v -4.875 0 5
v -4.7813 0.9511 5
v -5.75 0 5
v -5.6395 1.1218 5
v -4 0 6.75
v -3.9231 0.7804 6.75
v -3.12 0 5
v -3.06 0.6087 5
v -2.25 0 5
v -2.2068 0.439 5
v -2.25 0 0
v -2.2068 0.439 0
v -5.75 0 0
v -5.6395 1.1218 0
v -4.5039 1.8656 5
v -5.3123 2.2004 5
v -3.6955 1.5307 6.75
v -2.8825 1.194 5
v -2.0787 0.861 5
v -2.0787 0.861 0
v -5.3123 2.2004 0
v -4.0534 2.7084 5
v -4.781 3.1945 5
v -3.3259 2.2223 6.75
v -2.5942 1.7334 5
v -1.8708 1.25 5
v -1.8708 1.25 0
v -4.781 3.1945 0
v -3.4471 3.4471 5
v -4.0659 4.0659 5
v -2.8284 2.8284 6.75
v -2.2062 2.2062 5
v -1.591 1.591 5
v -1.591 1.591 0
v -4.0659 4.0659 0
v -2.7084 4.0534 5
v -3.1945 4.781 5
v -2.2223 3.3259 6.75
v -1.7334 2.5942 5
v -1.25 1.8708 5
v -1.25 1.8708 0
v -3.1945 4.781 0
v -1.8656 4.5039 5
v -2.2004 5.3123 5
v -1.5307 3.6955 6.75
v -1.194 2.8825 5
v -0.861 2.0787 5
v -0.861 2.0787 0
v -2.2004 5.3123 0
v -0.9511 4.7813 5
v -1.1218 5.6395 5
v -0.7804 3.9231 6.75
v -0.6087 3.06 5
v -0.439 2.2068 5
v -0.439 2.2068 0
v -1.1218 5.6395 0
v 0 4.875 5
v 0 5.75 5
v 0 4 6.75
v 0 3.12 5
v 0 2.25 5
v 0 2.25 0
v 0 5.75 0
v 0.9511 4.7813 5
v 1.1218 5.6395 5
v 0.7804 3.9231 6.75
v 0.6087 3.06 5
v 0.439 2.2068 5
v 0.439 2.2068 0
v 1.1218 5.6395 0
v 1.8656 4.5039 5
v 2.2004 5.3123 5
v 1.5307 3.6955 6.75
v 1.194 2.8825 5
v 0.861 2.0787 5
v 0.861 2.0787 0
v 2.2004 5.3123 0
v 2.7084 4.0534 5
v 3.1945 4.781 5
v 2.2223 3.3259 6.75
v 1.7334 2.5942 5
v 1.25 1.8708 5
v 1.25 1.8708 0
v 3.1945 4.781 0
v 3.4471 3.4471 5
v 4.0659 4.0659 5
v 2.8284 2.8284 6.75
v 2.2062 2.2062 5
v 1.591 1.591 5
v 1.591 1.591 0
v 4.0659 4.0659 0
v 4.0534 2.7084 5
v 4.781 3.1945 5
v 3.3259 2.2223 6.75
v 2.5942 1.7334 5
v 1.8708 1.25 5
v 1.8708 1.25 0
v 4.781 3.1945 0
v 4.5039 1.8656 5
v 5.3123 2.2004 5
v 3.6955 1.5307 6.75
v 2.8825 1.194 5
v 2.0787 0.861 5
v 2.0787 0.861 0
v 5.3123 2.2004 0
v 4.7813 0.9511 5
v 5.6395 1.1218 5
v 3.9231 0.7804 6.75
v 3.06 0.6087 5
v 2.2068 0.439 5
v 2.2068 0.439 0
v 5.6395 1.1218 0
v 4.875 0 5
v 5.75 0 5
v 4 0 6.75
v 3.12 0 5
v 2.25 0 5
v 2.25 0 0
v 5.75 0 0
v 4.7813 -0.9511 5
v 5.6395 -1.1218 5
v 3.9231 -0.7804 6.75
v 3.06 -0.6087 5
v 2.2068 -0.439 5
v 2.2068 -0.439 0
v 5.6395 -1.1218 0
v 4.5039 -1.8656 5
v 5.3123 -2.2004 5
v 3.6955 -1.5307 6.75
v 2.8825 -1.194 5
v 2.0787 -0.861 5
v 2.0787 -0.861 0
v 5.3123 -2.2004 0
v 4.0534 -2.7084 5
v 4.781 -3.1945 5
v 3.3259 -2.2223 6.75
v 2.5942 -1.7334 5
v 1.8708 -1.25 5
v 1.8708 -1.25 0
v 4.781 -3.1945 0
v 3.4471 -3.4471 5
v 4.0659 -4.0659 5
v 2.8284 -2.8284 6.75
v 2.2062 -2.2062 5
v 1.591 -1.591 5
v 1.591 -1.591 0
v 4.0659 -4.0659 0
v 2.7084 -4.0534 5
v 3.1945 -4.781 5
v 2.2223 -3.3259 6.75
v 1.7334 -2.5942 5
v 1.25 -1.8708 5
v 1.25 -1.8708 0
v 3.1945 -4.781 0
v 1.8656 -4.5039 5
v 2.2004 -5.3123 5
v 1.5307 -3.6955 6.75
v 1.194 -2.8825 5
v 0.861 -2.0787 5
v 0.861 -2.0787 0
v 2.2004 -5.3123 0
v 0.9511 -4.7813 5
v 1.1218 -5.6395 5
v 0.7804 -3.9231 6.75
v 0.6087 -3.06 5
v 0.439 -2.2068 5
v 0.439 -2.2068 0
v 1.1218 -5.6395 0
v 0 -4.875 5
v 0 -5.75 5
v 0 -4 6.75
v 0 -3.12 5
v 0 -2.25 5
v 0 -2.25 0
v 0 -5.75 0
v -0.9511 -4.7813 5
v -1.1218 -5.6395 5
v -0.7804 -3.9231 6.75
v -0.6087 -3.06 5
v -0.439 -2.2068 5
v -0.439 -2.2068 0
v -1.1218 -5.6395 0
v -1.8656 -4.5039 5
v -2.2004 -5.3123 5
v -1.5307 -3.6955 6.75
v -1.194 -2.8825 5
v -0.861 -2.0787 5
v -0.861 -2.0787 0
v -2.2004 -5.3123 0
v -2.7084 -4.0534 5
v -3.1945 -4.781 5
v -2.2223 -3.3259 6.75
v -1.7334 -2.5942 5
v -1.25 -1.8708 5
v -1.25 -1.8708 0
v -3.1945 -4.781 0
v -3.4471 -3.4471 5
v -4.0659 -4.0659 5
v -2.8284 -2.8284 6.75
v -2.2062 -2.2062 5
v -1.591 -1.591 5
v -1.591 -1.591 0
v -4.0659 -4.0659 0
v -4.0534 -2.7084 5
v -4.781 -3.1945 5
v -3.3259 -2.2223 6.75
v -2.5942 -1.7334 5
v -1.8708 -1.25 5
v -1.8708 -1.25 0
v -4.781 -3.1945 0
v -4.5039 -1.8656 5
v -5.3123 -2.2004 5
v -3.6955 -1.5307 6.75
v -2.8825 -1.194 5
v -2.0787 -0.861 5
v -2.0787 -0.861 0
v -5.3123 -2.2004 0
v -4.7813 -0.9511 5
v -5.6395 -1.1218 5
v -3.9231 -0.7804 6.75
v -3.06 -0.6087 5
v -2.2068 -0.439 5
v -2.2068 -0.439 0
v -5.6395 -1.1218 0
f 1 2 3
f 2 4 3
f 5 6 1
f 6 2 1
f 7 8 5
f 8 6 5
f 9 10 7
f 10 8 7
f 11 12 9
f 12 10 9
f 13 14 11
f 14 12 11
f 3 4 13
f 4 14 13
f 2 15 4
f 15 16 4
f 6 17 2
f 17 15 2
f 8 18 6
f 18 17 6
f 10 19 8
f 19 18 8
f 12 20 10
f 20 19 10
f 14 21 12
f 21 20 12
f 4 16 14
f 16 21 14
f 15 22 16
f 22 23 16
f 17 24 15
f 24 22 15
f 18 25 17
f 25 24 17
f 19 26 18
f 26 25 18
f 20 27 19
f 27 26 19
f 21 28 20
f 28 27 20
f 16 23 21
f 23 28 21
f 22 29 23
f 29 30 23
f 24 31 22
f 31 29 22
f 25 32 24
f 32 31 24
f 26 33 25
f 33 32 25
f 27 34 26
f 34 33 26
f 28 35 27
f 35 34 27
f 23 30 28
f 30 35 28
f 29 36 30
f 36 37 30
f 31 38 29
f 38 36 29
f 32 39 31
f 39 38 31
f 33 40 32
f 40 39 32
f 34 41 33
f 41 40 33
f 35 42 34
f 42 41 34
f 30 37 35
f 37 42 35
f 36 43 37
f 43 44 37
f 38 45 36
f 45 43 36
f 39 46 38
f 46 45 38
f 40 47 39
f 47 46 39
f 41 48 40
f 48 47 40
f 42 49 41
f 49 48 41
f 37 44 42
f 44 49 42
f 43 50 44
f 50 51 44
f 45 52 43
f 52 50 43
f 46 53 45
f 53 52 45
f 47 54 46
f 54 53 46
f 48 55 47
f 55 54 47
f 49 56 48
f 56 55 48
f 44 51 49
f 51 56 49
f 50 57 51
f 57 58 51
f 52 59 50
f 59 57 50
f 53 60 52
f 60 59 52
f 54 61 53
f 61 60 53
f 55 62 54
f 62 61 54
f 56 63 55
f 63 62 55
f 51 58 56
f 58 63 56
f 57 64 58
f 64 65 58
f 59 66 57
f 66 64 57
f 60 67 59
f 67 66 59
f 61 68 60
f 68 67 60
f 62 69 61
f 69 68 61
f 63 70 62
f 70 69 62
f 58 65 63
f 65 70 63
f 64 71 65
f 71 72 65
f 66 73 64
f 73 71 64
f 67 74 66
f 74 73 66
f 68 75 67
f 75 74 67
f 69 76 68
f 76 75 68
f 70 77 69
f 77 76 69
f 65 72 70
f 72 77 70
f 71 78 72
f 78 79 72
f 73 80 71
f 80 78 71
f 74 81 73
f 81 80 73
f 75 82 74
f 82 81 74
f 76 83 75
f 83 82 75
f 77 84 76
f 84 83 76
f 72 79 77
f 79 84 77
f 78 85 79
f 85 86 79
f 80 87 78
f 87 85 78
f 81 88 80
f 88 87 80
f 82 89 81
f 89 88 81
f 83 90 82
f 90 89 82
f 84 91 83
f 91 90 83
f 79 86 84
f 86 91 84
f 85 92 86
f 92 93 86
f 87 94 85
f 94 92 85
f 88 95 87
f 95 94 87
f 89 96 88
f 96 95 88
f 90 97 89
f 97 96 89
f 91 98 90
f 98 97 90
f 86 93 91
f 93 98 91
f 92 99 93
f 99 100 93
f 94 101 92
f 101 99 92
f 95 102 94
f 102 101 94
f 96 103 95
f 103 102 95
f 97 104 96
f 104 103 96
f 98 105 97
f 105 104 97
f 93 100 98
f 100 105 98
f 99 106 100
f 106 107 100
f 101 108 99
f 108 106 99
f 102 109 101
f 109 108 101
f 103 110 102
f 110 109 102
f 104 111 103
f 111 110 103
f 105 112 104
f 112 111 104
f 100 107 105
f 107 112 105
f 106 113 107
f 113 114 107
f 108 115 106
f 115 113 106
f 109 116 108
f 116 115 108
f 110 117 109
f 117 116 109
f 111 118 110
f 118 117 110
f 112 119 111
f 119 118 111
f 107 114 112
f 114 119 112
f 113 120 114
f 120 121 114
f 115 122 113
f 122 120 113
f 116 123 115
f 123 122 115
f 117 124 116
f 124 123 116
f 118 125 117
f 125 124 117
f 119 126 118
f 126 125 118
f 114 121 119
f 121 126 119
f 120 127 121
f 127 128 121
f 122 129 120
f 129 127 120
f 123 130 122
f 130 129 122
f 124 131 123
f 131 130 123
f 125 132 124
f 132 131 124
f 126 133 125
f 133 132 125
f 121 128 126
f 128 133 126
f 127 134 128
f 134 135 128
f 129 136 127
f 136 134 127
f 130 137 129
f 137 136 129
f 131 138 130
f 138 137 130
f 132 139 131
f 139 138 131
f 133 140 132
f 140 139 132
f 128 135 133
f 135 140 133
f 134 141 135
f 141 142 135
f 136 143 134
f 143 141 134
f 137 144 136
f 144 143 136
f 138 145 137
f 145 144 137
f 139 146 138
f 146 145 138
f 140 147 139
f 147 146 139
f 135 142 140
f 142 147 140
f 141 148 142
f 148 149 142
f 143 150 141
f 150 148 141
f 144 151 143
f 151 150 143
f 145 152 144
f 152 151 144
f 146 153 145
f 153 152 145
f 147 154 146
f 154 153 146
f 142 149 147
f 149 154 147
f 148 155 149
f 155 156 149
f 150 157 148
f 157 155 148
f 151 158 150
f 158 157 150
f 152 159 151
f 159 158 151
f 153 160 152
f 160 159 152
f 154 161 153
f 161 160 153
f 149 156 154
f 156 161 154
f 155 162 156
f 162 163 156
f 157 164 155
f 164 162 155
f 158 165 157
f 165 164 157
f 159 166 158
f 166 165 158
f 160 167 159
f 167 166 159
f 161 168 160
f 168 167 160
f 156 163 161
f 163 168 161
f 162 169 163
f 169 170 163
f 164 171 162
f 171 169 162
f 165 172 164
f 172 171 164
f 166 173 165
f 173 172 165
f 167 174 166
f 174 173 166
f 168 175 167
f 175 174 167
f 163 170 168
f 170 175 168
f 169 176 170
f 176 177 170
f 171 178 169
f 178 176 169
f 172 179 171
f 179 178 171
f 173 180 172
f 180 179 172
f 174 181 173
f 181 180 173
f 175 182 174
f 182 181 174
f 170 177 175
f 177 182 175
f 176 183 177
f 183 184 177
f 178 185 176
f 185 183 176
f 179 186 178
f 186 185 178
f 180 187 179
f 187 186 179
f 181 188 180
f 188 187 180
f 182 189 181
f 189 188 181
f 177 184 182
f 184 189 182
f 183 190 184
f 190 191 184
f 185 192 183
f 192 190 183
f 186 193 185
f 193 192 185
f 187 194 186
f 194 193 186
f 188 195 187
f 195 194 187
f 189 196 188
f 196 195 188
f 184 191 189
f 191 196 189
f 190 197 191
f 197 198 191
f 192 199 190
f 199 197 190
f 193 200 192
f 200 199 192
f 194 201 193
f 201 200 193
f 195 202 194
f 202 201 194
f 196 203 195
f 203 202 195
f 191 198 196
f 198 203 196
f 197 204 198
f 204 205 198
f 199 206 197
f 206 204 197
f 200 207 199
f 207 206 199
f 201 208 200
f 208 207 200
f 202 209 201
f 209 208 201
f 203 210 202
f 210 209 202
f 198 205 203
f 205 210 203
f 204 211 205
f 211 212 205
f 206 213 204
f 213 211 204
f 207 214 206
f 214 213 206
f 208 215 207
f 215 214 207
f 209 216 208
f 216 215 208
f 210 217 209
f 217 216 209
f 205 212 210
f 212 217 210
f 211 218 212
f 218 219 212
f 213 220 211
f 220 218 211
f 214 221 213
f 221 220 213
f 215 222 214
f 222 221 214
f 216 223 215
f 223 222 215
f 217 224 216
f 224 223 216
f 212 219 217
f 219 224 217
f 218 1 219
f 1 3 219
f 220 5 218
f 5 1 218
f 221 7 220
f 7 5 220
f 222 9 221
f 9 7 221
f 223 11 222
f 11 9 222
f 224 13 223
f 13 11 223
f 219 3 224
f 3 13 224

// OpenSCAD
$fn = 32;

// ----------------------------------------------------------------------
// Form washer: domed washer, 11.5 mm outside, 4.5 mm bore
// ----------------------------------------------------------------------

// --- parameters (mm) ---
revolve_angle = 360;      // full turn around the Z axis
profile_points = 7;       // points of the closed outline

profile = [[2.25, 0], [5.75, 0], [5.75, 5], [4.875, 5], [4, 6.75], [3.12, 5], [2.25, 5]];  // single closed polygon, 7 points, counter clockwise

// --- the one profile operation ---
rotate_extrude(angle = revolve_angle) polygon(points = profile);
